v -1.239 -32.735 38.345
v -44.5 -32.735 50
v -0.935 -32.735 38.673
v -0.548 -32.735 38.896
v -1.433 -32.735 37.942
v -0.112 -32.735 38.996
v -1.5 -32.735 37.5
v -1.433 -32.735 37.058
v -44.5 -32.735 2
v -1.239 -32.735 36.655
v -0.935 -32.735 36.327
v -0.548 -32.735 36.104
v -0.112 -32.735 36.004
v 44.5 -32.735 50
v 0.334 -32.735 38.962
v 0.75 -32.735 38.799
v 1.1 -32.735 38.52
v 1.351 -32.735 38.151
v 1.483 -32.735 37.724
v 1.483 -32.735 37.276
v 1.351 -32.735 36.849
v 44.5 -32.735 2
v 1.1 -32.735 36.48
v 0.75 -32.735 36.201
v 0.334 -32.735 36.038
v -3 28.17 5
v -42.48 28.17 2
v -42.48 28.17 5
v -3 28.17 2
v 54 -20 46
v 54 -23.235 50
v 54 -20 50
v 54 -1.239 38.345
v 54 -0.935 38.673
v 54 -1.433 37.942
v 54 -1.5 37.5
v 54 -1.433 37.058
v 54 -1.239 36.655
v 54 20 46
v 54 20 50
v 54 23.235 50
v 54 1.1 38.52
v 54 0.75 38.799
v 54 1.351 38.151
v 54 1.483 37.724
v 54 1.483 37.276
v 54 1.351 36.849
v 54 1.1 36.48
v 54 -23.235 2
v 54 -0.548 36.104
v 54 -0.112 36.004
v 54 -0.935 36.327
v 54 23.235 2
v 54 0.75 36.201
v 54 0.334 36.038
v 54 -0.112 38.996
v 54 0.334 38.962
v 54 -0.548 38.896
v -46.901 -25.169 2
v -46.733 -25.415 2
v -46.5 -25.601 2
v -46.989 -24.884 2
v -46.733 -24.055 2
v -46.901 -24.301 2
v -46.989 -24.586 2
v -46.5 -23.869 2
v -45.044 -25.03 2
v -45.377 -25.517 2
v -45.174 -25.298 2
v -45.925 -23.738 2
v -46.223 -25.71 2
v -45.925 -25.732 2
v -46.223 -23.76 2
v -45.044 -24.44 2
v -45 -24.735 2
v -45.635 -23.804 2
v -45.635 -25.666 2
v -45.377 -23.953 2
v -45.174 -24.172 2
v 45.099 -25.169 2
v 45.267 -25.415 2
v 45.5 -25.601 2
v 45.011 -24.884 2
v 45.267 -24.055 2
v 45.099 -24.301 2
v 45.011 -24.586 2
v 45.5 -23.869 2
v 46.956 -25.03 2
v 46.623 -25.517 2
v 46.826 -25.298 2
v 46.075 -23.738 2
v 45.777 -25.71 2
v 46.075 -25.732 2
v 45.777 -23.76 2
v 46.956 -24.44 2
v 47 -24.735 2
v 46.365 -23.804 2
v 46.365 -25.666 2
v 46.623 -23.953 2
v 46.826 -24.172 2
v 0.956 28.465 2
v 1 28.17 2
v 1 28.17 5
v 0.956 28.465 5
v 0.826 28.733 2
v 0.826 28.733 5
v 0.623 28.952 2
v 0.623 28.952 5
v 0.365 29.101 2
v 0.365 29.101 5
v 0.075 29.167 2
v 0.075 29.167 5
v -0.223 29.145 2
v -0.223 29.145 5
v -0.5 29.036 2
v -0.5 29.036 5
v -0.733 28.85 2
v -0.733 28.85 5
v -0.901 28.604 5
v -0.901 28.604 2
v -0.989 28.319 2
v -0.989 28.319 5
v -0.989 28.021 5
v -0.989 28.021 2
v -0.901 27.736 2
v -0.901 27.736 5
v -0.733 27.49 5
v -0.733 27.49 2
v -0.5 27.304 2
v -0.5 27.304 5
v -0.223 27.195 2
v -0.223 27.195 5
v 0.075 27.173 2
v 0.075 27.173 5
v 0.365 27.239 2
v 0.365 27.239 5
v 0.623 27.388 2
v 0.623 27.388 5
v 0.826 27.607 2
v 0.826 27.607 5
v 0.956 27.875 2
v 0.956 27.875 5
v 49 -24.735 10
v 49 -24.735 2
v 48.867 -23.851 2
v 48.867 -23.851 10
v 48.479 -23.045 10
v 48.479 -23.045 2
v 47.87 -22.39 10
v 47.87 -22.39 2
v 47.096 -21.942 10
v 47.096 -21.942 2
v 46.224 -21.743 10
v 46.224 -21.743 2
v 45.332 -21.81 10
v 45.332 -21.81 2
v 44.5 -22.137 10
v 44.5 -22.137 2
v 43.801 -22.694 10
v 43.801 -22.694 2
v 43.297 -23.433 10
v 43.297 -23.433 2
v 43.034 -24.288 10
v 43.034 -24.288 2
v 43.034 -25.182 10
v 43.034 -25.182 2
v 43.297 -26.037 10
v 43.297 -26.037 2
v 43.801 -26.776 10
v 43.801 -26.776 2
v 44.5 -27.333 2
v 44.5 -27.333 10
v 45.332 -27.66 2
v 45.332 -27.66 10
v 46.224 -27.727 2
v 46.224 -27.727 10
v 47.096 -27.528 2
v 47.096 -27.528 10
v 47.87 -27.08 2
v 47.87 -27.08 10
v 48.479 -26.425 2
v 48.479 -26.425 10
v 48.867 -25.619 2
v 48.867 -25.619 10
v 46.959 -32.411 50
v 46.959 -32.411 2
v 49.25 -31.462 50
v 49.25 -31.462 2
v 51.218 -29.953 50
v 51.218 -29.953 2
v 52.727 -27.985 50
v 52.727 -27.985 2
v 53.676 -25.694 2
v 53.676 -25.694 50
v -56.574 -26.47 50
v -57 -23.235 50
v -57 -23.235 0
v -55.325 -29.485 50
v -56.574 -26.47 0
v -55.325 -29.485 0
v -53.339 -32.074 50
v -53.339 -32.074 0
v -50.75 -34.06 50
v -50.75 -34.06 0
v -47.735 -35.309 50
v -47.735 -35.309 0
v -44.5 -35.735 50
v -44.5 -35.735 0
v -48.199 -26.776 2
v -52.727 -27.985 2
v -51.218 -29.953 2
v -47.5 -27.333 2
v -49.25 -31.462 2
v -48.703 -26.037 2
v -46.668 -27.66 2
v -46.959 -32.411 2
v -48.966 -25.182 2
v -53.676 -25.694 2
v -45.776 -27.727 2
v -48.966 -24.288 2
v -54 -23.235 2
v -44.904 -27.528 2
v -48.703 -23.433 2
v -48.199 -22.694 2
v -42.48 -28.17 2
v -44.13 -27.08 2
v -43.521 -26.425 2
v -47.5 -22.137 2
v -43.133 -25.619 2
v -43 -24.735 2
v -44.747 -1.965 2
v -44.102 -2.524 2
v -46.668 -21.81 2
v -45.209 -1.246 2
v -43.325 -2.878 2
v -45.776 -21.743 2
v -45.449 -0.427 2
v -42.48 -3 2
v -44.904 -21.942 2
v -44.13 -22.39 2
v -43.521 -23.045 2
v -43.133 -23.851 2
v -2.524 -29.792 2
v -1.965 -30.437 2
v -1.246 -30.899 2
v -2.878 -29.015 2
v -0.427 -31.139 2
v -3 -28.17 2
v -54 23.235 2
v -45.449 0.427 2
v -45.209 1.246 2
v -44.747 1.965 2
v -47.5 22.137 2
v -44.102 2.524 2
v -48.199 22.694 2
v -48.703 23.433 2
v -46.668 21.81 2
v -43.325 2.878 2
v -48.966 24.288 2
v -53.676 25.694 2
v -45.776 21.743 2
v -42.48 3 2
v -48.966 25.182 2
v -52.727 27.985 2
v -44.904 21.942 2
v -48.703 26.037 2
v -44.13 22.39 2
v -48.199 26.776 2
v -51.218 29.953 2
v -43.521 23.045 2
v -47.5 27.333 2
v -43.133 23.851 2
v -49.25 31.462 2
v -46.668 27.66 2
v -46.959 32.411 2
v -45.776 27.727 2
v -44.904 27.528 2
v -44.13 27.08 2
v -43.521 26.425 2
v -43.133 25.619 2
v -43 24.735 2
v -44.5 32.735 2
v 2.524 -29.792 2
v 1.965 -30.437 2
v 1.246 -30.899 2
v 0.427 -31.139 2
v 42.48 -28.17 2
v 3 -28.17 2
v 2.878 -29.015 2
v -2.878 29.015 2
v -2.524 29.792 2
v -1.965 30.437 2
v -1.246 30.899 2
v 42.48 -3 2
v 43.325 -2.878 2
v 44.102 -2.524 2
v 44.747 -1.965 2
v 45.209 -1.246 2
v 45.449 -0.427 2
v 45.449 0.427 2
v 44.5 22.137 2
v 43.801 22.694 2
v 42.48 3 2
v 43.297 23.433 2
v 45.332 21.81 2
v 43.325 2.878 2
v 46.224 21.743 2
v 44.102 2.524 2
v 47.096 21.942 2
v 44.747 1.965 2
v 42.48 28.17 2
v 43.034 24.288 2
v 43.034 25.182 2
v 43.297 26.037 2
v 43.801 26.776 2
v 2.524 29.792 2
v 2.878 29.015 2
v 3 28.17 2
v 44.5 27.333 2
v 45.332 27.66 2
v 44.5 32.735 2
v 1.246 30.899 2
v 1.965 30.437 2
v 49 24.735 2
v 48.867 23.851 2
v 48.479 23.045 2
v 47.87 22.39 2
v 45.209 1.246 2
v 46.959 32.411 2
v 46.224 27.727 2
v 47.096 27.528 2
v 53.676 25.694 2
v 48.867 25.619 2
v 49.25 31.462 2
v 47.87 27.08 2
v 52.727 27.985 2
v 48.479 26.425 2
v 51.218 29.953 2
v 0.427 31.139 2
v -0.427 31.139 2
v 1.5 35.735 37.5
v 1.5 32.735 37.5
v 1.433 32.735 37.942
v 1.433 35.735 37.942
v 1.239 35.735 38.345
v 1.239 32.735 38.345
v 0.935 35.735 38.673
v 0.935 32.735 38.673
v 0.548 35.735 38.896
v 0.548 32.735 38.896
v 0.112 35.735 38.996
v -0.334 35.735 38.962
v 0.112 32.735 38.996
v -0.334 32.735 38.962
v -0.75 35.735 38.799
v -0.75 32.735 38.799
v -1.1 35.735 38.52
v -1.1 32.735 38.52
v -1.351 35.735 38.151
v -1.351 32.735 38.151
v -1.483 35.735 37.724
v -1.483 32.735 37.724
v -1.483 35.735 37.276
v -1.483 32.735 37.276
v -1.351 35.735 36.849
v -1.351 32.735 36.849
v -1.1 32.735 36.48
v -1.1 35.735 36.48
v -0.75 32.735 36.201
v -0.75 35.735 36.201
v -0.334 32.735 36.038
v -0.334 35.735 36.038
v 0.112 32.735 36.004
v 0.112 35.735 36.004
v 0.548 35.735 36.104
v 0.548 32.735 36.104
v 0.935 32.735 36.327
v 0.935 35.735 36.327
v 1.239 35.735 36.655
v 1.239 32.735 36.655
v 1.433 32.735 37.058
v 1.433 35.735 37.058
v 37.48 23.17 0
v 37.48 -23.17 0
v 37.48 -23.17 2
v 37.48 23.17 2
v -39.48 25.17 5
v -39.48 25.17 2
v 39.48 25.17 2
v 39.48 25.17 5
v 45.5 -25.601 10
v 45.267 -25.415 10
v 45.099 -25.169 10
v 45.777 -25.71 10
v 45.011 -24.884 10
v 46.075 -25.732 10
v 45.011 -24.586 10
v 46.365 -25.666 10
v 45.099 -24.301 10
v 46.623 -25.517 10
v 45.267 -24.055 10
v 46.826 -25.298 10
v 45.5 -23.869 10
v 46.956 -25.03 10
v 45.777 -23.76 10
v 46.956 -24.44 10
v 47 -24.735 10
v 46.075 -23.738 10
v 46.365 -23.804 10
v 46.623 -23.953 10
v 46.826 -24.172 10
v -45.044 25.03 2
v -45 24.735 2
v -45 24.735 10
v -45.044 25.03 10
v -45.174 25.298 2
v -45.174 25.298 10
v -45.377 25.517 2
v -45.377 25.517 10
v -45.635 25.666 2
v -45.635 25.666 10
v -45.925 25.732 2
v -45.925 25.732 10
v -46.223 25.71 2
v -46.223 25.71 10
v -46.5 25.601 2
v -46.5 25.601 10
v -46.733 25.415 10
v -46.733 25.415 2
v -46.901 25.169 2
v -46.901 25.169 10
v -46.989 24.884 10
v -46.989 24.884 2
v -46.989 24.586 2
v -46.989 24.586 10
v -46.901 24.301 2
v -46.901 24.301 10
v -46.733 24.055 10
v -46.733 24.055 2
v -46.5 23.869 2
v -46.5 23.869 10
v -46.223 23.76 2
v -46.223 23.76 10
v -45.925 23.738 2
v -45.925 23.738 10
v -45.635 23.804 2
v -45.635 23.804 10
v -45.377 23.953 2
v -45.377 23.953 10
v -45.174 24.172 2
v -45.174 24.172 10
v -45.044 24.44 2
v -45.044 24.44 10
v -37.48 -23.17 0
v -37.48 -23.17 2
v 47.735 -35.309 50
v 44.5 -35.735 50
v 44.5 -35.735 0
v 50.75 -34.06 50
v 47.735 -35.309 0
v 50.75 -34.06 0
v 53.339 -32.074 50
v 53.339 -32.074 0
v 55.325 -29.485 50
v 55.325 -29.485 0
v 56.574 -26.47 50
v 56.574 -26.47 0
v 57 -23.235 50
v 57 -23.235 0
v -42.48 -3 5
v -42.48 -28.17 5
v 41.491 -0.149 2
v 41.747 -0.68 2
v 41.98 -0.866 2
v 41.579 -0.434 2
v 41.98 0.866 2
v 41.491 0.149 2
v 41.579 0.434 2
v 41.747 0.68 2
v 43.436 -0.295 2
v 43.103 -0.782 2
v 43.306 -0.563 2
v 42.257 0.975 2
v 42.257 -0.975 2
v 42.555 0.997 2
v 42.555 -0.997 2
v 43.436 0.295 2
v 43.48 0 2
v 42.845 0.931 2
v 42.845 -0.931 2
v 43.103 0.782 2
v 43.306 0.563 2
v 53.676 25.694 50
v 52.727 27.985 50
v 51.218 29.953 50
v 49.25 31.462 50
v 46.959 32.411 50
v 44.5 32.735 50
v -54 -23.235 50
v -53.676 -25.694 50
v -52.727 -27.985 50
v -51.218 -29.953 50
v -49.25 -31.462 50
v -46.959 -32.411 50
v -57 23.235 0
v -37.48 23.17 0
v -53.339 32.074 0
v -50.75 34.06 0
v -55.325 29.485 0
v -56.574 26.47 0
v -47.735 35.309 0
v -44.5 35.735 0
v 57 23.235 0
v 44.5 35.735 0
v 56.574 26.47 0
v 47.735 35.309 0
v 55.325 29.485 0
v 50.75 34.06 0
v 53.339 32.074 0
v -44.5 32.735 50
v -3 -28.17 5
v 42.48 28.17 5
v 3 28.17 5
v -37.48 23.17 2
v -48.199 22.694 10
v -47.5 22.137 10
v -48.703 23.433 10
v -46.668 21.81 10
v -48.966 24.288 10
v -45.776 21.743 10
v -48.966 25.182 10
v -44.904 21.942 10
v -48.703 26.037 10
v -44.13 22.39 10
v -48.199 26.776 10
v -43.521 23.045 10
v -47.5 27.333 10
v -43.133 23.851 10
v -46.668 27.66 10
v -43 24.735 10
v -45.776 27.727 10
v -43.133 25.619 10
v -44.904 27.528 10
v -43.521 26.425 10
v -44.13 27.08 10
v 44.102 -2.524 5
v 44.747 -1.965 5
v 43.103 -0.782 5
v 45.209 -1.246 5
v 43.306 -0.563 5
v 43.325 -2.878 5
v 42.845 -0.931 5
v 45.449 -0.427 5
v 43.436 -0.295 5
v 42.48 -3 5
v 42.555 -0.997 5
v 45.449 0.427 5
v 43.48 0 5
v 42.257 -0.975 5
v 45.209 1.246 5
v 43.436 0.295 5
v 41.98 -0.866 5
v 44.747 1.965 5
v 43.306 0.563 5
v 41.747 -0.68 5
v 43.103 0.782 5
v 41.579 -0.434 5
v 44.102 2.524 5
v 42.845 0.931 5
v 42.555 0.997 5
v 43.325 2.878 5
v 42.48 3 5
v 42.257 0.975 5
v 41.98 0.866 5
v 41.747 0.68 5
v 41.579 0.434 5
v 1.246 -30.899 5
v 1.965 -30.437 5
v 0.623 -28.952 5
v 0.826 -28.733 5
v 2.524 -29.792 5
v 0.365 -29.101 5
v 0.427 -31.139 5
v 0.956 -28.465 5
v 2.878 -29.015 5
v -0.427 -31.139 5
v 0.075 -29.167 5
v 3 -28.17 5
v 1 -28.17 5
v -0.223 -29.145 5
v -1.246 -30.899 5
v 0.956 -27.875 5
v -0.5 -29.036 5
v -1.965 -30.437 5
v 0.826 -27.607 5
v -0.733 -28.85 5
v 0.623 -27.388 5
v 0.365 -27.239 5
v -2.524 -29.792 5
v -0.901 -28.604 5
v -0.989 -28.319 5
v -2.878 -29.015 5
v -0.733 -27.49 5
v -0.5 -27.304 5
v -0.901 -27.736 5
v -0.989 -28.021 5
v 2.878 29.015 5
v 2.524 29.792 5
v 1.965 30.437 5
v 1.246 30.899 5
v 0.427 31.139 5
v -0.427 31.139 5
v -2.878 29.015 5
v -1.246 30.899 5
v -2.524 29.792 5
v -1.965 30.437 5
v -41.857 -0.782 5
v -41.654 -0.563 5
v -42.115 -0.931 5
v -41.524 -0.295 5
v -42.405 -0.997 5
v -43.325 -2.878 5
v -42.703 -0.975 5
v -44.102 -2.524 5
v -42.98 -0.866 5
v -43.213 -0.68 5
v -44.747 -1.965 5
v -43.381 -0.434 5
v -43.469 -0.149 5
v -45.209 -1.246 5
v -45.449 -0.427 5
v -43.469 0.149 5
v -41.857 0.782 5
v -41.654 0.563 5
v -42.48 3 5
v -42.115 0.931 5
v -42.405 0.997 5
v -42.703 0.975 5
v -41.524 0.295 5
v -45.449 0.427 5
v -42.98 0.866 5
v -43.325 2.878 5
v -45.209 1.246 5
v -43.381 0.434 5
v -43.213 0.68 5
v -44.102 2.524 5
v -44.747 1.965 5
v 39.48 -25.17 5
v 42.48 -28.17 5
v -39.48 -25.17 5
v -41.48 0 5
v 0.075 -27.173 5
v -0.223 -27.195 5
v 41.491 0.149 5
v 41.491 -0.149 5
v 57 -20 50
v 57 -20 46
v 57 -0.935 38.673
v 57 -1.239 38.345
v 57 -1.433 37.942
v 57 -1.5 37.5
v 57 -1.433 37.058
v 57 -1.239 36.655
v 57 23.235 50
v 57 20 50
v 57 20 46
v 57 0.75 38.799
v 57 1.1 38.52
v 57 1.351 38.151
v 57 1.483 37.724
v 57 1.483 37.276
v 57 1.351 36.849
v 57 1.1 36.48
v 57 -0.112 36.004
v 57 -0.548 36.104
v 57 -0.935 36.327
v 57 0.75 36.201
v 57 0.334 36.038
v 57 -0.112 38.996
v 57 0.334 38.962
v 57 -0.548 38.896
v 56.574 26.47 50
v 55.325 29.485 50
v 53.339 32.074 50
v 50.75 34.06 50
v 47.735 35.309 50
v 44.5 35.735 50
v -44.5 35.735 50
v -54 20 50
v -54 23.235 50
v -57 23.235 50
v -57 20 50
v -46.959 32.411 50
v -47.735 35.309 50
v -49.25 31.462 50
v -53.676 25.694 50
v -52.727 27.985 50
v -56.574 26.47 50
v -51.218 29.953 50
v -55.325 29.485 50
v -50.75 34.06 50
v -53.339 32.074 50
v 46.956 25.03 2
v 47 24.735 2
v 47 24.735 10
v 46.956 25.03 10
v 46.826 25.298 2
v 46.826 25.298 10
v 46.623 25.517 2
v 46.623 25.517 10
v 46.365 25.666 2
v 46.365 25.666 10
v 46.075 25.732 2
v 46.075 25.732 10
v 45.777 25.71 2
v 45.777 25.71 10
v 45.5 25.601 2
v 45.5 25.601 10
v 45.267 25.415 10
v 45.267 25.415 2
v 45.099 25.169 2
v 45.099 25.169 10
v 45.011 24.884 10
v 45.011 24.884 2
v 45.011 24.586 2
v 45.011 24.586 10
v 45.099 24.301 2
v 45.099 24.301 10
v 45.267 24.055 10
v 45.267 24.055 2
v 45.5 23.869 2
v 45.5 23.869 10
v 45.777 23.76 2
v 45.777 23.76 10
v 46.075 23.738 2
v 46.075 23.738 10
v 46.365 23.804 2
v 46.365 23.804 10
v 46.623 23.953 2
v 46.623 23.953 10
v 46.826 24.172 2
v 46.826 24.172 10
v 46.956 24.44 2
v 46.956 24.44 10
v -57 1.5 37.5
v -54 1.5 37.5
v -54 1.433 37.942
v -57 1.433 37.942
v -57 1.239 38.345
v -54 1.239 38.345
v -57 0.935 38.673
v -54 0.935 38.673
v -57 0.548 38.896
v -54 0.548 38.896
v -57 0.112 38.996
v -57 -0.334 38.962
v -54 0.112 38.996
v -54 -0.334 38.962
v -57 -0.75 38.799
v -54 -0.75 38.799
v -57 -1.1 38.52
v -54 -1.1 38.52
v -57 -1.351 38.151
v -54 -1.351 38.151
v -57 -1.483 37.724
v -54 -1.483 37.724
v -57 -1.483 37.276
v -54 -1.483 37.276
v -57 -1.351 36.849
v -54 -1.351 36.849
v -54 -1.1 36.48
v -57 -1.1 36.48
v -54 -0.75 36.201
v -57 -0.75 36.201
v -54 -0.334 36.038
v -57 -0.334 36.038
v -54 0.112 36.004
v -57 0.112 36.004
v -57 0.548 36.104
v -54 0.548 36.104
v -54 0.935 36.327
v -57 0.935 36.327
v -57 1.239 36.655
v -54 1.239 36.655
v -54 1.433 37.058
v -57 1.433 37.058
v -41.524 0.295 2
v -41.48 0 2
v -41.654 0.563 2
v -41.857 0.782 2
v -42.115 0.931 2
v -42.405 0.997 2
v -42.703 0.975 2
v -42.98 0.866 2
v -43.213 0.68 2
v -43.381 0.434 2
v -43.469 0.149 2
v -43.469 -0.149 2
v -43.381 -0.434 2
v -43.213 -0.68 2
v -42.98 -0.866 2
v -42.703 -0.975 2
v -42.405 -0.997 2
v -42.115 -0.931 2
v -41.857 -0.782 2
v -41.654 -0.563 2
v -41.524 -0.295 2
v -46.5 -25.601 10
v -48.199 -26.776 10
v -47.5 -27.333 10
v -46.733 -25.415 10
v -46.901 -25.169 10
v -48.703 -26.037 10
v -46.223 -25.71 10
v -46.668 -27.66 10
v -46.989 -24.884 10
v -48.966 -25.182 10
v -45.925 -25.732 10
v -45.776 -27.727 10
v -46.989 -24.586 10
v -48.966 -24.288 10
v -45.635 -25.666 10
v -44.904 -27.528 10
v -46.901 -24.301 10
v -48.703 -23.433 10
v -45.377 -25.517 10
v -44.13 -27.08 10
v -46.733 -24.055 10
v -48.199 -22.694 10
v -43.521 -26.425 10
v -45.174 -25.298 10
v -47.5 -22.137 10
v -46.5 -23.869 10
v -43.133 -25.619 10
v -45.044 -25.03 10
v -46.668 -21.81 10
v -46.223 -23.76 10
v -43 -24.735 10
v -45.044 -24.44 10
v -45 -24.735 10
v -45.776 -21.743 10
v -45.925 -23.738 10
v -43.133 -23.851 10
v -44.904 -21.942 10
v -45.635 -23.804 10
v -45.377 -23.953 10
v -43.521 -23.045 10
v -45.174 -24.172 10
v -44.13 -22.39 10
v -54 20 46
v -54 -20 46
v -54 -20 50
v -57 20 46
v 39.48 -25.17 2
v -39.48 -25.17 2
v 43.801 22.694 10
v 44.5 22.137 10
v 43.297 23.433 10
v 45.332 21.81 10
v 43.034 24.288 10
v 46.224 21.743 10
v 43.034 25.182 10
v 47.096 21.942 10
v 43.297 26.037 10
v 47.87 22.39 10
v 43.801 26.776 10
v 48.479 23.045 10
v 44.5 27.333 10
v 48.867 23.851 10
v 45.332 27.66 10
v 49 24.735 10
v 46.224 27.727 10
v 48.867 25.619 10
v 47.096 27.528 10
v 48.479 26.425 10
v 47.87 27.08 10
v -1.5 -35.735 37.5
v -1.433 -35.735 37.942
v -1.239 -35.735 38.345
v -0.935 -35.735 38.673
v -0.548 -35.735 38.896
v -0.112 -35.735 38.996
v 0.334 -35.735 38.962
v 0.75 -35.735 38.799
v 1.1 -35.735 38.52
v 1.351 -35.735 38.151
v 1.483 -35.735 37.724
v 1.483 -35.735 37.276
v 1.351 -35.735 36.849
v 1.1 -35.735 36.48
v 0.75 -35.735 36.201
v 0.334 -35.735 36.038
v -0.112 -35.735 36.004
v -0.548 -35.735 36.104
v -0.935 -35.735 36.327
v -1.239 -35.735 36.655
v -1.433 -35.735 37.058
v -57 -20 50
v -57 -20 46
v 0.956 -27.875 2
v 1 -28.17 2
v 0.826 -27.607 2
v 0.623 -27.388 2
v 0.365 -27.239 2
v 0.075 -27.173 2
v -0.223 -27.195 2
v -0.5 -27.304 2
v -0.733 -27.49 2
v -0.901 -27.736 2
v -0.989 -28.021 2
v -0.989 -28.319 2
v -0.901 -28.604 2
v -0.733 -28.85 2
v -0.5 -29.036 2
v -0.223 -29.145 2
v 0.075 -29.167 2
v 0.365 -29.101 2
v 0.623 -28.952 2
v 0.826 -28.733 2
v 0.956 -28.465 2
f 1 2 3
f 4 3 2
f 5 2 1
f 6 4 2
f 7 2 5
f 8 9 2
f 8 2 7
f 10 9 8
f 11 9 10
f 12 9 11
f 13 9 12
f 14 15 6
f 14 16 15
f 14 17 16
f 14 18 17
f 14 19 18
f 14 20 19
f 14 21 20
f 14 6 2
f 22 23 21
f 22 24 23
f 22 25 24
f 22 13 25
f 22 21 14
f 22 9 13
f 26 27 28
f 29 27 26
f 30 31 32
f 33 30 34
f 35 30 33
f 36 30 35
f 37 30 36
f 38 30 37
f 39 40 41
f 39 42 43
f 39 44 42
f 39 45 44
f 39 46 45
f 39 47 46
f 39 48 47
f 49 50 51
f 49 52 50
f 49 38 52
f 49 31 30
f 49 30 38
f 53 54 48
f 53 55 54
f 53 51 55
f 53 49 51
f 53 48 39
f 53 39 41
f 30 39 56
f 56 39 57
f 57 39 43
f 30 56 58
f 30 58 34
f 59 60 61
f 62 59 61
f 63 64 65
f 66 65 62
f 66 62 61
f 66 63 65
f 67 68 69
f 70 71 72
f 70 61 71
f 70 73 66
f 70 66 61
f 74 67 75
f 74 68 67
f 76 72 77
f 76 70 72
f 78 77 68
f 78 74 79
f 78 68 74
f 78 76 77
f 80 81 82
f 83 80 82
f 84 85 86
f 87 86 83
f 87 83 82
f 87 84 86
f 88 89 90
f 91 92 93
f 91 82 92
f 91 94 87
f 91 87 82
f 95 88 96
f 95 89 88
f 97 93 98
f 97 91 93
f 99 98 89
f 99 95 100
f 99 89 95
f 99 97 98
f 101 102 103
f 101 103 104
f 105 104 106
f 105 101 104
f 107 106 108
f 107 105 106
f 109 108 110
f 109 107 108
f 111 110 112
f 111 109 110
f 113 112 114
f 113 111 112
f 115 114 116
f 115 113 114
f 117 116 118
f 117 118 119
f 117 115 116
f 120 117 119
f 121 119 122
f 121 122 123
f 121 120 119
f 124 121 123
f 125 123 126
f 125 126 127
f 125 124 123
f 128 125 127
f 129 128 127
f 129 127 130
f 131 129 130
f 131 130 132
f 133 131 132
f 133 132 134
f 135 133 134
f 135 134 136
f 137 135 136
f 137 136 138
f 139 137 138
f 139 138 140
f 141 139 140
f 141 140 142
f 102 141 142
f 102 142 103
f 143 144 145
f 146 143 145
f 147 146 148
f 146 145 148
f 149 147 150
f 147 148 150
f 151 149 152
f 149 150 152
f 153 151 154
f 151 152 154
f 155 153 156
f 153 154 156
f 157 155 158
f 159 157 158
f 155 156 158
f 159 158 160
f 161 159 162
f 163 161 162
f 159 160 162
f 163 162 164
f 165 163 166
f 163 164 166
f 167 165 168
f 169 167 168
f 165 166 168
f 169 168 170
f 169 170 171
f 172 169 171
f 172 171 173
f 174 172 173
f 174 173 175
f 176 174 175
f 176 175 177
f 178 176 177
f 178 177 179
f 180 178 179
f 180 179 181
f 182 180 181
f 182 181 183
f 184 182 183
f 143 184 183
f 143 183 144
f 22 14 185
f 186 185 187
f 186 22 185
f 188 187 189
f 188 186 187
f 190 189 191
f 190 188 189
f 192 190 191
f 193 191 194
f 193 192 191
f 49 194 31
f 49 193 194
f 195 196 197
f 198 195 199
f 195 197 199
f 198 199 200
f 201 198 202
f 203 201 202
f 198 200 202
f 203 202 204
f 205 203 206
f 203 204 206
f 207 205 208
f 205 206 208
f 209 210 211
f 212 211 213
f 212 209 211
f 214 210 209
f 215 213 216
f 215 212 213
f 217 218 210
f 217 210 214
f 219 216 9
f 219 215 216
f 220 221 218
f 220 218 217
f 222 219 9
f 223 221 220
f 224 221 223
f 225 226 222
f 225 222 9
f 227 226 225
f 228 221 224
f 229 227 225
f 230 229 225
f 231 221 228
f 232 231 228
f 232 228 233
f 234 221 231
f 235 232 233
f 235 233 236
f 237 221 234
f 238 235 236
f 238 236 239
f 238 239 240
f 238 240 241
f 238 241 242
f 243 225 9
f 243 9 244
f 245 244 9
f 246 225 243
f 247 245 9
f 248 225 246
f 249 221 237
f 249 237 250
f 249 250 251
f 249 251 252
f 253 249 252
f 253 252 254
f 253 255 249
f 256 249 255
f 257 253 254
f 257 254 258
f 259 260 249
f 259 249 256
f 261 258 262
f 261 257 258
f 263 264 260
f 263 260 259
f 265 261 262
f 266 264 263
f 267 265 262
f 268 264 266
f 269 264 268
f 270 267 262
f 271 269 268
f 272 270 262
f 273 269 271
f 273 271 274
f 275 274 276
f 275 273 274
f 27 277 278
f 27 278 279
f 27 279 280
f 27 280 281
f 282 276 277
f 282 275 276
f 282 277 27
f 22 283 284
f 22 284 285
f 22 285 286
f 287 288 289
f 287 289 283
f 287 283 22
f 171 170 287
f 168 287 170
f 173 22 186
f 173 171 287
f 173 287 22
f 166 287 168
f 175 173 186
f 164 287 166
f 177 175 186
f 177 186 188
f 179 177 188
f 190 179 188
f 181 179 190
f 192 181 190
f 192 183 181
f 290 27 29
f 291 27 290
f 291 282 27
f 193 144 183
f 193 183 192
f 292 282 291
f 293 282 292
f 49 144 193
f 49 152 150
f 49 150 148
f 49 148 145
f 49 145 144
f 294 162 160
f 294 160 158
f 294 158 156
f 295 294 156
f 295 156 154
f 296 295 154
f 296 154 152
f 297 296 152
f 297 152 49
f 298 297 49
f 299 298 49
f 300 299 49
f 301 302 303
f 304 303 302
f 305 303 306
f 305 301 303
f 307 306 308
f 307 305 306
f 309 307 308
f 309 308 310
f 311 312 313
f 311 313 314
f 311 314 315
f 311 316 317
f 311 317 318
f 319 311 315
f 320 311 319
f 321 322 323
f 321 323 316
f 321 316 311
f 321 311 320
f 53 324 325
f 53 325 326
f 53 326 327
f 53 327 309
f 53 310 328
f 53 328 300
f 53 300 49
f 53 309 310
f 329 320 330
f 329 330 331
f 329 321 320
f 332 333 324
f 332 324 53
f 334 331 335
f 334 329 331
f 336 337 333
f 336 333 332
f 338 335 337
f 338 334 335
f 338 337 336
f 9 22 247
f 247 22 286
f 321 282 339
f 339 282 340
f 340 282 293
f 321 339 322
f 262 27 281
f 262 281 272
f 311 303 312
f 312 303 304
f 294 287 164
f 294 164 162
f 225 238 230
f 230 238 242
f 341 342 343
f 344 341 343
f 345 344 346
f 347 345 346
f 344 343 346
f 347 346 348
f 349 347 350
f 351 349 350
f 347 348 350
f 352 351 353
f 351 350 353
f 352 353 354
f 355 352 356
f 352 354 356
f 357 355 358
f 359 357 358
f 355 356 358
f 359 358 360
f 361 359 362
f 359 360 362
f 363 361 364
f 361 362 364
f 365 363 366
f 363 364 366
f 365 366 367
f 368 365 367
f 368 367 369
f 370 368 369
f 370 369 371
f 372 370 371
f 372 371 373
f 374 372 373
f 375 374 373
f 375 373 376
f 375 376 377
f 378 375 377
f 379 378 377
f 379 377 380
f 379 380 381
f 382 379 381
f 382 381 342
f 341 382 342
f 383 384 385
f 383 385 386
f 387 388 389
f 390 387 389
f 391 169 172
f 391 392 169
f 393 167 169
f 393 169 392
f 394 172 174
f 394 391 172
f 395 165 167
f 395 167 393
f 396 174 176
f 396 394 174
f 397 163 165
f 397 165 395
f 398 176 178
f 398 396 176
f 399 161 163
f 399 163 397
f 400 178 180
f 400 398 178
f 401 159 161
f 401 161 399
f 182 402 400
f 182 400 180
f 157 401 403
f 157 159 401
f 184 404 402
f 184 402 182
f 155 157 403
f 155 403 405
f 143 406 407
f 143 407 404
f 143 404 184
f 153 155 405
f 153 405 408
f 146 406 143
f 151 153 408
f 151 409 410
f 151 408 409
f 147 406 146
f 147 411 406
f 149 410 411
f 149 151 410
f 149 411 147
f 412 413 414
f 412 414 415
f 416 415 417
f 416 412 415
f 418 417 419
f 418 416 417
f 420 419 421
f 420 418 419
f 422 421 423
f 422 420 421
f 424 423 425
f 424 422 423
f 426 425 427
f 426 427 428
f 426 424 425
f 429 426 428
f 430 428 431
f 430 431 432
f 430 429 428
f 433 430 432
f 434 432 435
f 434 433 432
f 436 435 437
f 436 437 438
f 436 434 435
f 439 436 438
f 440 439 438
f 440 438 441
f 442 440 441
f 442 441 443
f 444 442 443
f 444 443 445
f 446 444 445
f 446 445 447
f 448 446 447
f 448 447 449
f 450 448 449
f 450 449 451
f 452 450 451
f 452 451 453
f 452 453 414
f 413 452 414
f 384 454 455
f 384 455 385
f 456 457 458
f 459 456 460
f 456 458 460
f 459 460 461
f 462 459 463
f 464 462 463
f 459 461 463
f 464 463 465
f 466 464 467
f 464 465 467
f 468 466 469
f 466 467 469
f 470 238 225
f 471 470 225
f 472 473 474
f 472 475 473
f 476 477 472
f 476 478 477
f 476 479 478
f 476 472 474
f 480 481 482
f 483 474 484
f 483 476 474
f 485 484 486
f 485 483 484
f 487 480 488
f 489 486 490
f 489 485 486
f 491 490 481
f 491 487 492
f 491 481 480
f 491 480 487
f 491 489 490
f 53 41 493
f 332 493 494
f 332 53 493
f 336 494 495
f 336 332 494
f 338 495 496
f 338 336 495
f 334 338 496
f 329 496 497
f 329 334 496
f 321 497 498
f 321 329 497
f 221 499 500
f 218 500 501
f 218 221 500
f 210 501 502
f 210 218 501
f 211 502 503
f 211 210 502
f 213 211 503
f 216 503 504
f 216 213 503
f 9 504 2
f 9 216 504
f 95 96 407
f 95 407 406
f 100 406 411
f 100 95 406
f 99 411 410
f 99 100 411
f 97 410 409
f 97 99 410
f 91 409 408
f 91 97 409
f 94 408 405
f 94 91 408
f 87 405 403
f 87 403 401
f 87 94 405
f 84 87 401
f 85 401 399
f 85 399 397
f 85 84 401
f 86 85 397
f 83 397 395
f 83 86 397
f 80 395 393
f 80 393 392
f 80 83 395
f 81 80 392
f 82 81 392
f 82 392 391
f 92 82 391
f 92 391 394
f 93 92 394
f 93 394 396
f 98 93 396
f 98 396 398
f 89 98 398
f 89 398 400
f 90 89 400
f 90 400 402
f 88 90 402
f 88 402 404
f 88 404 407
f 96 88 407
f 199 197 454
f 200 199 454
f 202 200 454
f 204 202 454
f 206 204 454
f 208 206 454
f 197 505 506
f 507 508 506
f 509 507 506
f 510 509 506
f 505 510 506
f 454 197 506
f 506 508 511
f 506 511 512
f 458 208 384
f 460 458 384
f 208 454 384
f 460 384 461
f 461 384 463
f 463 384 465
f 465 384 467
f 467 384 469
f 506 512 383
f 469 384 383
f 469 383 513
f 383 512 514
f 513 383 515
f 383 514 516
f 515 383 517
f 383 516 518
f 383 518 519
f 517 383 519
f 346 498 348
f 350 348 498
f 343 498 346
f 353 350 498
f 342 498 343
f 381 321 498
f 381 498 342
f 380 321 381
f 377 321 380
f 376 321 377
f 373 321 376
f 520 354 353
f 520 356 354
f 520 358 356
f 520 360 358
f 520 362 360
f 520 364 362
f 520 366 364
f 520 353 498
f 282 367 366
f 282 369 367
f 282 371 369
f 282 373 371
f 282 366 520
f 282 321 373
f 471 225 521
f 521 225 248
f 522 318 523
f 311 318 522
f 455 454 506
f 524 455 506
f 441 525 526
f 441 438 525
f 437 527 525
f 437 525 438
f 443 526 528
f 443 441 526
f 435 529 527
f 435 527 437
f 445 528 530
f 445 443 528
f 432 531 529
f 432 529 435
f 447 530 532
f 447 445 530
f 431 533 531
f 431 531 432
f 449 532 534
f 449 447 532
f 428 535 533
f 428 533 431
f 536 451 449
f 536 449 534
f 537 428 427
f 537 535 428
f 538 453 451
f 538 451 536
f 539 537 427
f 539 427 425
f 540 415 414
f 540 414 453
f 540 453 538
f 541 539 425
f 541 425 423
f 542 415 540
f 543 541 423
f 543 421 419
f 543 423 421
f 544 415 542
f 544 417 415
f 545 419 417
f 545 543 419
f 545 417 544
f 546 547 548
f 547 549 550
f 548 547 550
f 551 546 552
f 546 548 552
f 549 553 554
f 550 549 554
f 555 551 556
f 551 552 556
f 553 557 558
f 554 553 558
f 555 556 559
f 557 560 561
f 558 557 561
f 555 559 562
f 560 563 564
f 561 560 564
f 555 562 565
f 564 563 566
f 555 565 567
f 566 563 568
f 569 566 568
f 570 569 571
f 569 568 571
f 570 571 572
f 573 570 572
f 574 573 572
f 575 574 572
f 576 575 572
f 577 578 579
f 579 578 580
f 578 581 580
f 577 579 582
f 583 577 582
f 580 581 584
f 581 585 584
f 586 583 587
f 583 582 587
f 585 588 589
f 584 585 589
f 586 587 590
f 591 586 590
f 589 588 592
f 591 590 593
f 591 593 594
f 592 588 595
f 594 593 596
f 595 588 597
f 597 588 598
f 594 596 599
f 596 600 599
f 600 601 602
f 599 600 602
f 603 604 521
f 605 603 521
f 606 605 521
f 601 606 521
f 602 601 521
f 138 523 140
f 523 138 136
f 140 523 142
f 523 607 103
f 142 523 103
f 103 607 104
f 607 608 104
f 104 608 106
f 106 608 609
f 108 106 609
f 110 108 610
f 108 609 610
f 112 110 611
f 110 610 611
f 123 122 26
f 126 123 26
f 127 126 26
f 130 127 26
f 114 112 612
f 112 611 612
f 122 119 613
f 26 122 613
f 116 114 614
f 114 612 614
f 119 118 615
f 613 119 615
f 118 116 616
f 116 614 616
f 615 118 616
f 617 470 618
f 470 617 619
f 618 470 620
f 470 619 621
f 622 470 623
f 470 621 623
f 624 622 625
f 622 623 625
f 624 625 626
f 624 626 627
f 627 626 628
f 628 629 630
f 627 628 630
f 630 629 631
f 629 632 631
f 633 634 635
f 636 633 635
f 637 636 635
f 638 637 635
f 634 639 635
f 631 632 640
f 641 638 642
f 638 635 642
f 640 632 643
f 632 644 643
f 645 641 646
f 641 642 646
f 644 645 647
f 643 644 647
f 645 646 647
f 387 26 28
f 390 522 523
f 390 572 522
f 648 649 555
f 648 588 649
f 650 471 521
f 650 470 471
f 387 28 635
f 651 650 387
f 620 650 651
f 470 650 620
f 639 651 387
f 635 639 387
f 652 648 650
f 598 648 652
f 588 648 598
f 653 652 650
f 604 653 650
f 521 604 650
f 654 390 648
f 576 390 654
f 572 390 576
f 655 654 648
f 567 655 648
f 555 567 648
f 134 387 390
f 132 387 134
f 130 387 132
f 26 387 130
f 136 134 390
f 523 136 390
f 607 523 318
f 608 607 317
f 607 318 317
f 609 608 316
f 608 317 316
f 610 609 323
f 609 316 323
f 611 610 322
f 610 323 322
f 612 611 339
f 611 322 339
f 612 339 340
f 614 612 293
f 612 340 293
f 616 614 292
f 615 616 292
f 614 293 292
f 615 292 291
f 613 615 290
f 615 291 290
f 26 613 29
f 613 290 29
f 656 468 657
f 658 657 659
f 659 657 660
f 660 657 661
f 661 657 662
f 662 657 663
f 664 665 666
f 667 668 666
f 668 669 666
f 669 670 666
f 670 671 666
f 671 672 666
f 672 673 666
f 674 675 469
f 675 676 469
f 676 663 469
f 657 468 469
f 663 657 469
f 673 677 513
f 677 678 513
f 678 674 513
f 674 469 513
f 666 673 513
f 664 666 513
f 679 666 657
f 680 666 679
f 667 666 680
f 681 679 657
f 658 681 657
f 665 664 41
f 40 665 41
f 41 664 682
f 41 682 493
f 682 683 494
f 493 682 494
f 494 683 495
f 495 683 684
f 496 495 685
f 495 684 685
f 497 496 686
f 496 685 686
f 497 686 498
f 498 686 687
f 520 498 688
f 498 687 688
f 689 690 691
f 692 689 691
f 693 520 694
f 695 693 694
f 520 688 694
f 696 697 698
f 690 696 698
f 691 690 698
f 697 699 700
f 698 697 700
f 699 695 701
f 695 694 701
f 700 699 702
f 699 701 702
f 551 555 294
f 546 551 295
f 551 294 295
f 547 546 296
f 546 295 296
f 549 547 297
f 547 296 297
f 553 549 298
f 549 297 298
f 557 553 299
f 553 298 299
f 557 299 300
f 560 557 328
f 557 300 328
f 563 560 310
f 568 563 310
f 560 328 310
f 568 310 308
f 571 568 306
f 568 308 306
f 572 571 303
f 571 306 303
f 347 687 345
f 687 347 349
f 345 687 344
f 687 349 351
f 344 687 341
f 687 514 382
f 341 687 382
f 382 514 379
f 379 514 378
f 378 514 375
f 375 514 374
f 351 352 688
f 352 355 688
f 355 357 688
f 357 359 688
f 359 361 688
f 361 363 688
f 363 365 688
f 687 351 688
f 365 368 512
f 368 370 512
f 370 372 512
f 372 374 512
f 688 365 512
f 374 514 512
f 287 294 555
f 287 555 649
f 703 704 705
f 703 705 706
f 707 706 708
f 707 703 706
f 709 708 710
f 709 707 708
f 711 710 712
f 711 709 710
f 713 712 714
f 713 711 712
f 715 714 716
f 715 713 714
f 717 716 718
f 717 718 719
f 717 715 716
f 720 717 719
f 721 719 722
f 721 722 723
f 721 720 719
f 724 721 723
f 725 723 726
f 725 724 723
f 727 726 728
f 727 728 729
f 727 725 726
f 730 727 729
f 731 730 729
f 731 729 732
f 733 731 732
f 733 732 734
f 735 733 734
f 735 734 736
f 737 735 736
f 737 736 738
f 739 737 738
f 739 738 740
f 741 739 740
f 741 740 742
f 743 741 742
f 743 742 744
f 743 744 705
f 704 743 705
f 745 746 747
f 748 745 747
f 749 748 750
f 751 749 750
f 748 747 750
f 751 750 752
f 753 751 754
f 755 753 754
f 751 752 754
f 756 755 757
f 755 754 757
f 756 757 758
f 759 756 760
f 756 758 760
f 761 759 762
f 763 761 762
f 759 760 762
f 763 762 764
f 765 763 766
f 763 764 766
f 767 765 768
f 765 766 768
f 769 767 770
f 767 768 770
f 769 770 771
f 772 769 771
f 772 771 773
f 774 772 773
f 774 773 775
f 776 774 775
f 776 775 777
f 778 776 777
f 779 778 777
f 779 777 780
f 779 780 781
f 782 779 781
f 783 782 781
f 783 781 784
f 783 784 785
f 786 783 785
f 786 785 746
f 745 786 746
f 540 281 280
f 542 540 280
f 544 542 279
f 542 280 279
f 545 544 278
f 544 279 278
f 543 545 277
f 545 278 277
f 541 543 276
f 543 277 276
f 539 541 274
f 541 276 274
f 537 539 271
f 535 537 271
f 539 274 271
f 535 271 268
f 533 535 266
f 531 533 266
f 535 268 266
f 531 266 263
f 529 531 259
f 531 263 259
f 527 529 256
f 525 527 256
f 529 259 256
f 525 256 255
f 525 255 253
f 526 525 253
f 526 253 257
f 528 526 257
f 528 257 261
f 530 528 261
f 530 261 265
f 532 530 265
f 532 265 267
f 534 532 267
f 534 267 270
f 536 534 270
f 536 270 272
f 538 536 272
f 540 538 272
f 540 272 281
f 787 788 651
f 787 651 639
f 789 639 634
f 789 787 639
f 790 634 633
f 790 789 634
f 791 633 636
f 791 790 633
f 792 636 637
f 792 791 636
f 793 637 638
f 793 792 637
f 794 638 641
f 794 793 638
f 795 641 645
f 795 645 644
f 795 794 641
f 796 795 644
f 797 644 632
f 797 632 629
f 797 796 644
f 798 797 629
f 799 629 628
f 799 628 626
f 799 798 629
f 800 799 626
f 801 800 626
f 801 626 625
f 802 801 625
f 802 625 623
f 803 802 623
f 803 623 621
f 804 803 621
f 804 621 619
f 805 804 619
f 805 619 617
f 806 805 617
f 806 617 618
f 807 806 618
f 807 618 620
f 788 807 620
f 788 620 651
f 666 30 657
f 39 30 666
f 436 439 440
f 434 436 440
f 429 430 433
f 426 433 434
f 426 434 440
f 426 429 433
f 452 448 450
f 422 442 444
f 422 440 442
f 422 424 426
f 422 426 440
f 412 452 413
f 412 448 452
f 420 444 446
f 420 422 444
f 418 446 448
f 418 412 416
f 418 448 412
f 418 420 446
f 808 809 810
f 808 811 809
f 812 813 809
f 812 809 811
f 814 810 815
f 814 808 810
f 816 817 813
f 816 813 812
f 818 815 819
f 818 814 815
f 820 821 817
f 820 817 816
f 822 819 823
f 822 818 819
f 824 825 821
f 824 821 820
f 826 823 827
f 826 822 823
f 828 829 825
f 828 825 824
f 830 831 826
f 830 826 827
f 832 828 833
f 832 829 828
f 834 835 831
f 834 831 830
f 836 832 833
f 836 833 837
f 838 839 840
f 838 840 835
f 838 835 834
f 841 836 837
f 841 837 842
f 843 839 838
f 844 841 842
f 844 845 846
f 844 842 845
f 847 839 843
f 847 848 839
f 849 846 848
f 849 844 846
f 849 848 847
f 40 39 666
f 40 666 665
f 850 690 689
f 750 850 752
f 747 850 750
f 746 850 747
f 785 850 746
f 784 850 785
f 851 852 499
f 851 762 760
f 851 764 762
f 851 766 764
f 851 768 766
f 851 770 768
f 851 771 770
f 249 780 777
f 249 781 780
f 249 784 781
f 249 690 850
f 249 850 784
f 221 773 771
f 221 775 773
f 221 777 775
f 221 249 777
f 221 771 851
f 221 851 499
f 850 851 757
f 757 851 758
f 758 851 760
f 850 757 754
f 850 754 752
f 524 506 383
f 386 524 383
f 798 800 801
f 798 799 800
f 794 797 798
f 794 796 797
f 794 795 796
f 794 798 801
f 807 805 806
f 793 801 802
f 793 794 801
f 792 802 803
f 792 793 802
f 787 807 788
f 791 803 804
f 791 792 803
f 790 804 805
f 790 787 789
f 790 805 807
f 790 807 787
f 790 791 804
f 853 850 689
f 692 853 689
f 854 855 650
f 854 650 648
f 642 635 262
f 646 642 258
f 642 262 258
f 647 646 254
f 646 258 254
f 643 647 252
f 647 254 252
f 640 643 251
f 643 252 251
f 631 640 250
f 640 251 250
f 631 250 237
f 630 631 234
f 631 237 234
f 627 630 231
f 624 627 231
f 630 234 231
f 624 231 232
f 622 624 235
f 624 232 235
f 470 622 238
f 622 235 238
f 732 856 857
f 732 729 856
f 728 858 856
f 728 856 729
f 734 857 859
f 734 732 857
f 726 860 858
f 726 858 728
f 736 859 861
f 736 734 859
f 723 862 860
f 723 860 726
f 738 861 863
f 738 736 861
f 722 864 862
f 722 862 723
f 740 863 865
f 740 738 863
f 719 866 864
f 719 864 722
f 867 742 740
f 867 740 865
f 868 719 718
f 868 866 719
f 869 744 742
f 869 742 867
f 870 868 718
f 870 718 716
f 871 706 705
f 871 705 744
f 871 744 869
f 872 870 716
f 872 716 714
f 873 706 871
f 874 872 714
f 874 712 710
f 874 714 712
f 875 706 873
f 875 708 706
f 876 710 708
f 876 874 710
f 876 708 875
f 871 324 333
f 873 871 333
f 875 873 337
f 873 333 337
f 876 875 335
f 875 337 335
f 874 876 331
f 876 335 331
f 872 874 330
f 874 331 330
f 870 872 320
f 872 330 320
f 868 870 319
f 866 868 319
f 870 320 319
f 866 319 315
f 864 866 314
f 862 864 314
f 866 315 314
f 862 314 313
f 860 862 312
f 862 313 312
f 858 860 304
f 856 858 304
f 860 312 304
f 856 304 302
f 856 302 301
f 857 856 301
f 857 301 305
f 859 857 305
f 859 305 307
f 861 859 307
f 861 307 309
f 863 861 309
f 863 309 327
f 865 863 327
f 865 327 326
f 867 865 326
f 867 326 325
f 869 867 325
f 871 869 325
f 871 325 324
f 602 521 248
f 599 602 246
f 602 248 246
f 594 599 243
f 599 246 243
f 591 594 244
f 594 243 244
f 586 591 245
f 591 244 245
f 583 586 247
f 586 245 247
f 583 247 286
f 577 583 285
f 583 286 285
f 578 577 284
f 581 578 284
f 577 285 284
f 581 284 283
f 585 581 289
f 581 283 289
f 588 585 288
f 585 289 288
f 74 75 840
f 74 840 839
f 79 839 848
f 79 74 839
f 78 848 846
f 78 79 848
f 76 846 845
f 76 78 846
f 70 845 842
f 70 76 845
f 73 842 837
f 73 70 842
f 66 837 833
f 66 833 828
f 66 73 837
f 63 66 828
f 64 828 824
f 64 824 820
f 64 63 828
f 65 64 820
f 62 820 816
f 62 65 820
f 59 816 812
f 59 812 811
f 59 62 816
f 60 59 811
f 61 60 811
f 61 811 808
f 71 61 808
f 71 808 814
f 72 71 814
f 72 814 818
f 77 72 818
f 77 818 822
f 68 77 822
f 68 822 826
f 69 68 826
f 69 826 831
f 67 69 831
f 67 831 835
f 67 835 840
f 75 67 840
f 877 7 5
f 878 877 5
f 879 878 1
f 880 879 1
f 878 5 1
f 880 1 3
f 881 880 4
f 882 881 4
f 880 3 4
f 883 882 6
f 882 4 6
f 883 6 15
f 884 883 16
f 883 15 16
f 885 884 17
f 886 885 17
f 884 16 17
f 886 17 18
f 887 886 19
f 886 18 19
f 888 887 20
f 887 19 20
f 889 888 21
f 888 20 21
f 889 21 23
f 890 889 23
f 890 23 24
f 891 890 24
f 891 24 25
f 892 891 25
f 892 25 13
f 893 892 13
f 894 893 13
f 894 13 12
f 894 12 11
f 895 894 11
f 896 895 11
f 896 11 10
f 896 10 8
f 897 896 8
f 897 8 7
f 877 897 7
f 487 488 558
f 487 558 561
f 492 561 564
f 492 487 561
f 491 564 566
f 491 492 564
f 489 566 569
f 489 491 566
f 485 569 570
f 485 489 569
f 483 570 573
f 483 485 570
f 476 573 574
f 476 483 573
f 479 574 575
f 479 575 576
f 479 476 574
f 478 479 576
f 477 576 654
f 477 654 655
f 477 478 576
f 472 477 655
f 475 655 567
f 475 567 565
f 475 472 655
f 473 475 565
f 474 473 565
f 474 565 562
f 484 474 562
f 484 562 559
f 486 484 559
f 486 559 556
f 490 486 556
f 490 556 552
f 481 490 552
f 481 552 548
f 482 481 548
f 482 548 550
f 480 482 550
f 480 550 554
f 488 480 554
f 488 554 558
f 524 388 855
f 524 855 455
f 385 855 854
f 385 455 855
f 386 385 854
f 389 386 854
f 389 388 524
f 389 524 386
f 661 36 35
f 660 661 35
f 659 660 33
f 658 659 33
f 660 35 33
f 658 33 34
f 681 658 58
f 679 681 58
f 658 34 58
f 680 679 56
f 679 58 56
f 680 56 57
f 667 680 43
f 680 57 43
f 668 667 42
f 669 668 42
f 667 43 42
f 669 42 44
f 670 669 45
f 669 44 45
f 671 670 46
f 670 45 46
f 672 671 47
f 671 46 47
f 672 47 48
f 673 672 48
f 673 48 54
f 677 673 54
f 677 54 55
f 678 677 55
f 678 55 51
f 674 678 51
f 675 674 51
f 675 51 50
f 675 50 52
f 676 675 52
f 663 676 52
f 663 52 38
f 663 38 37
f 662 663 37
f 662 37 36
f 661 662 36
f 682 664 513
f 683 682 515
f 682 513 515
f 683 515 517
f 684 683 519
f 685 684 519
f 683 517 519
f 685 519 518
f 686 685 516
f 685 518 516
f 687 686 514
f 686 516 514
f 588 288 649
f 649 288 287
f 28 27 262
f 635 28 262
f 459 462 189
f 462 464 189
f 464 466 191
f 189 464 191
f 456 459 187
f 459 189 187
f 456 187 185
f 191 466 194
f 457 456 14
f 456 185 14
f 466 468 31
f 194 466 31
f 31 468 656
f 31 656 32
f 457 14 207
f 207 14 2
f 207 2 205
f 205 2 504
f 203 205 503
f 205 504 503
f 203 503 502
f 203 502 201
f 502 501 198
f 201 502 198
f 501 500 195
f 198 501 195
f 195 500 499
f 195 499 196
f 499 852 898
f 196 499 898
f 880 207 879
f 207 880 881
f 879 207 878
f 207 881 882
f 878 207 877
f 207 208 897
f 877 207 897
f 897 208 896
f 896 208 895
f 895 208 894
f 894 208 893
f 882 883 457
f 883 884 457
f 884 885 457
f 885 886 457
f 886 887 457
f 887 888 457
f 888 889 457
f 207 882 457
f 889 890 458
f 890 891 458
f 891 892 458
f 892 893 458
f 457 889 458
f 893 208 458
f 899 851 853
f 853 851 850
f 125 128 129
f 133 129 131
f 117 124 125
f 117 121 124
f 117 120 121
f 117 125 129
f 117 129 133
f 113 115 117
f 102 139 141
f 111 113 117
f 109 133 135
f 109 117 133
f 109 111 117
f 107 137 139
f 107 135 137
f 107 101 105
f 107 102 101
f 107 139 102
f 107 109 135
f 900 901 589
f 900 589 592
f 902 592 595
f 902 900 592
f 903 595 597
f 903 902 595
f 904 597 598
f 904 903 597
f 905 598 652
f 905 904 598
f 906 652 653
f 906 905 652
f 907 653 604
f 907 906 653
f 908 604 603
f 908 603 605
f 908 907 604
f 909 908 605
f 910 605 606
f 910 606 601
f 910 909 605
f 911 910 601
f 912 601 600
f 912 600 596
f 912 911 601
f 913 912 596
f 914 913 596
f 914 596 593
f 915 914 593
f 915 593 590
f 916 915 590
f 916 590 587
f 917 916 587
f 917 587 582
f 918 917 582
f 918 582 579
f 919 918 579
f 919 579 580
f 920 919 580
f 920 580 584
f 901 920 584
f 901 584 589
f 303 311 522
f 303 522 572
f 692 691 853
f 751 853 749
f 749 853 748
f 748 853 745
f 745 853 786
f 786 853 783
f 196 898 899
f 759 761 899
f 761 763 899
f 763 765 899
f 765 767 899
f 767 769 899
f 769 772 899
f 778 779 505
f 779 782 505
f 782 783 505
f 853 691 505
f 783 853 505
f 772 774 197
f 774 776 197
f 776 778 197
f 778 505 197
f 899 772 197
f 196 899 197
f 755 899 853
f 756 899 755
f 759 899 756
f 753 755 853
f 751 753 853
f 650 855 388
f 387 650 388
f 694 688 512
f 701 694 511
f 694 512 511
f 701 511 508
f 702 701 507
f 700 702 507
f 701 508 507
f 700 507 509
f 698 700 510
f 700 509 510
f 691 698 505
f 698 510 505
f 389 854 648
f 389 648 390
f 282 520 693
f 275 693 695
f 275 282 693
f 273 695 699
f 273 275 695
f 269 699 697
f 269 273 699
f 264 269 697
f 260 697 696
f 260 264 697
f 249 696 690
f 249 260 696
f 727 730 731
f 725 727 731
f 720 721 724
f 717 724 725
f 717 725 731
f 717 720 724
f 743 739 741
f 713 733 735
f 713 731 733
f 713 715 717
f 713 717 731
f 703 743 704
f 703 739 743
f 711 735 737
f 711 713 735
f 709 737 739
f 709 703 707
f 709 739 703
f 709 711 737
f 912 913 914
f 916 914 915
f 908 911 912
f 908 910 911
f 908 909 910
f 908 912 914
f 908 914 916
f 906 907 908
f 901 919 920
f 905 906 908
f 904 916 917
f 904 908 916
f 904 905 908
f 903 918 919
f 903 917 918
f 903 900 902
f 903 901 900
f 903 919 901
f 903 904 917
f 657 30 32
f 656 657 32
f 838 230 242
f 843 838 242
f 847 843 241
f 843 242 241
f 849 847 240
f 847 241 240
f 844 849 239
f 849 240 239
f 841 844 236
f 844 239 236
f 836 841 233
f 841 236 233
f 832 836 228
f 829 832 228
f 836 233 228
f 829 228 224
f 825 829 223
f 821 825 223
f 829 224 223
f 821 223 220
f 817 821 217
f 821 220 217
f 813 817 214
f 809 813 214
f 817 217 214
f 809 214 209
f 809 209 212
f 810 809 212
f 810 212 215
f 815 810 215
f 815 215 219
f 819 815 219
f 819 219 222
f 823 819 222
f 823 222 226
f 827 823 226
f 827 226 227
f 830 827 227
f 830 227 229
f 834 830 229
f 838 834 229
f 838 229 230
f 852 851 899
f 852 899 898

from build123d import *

# Parameters (mm, degrees)
SKETCH_R           = 1
SKETCH_W           = 78.96
SKETCH_H           = 50.34
PAD_DEPTH          = 5
SKETCH001_W        = 74.96
SKETCH001_H        = 46.34
PAD001_DEPTH       = 2
SKETCH002_R        = 3
SKETCH002_R_2      = 1
PAD002_DEPTH       = 10
PAD003_DEPTH       = 50
SKETCH004_W        = 40
SKETCH004_H        = 4
POCKET_DEPTH       = 57.001
POCKET_DEPTH_BACK  = -57.001
SKETCH005_R        = 1.5
POCKET001_DEPTH    = 322.817597
POLARPATTERN_COUNT = 4


with BuildPart() as part:
    # Sketch → Pad (new body)
    with BuildSketch(Plane.XY):
        with BuildLine():
            Line((-42.48, 28.17), (-3, 28.17))
            ThreePointArc((3, 28.17), (0, 31.17), (-3, 28.17))
            Line((3, 28.17), (42.48, 28.17))
            Line((42.48, 28.17), (42.48, 3))
            ThreePointArc((42.48, -3), (45.48, 0), (42.48, 3))
            Line((42.48, -3), (42.48, -28.17))
            Line((3, -28.17), (42.48, -28.17))
            ThreePointArc((-3, -28.17), (0, -31.17), (3, -28.17))
            Line((-42.48, -28.17), (-3, -28.17))
            Line((-42.48, -3), (-42.48, -28.17))
            ThreePointArc((-42.48, 3), (-45.48, 0), (-42.48, -3))
            Line((-42.48, 28.17), (-42.48, 3))
        make_face()
        with Locations((42.48, 0)):
            Circle(SKETCH_R, mode=Mode.SUBTRACT)
        with Locations((0, -28.17)):
            Circle(SKETCH_R, mode=Mode.SUBTRACT)
        with Locations((-42.48, 0)):
            Circle(SKETCH_R, mode=Mode.SUBTRACT)
        with Locations((0, 28.17)):
            Circle(SKETCH_R, mode=Mode.SUBTRACT)
        Rectangle(SKETCH_W, SKETCH_H, mode=Mode.SUBTRACT)
    extrude(amount=PAD_DEPTH)

    # Sketch001 → Pad001 (join)
    with BuildSketch(Plane.XY):
        with BuildLine():
            Line((-57, 23.235), (-57, -23.235))
            ThreePointArc((-57, -23.235), (-53.338835, -32.073835), (-44.5, -35.735))
            Line((-44.5, -35.735), (44.5, -35.735))
            ThreePointArc((44.5, -35.735), (53.338835, -32.073835), (57, -23.235))
            Line((57, -23.235), (57, 23.235))
            ThreePointArc((57, 23.235), (53.338835, 32.073835), (44.5, 35.735))
            Line((44.5, 35.735), (-44.5, 35.735))
            ThreePointArc((-44.5, 35.735), (-53.338835, 32.073835), (-57, 23.235))
        make_face()
        Rectangle(SKETCH001_W, SKETCH001_H, mode=Mode.SUBTRACT)
    extrude(amount=PAD001_DEPTH)

    # Sketch002 → Pad002 (join)
    with BuildSketch(Plane.XY):
        with Locations((-46, 24.735)):
            Circle(SKETCH002_R)
        with Locations((-46, 24.735)):
            Circle(SKETCH002_R_2, mode=Mode.SUBTRACT)
        with Locations((46, 24.735)):
            Circle(SKETCH002_R)
        with Locations((46, 24.735)):
            Circle(SKETCH002_R_2, mode=Mode.SUBTRACT)
        with Locations((46, -24.735)):
            Circle(SKETCH002_R)
        with Locations((46, -24.735)):
            Circle(SKETCH002_R_2, mode=Mode.SUBTRACT)
        with Locations((-46, -24.735)):
            Circle(SKETCH002_R)
        with Locations((-46, -24.735)):
            Circle(SKETCH002_R_2, mode=Mode.SUBTRACT)
    extrude(amount=PAD002_DEPTH)

    # Sketch003 → Pad003 (join)
    with BuildSketch(Plane.XY):
        with BuildLine():
            Line((-44.5, 35.735), (44.5, 35.735))
            ThreePointArc((57, 23.235), (53.338835, 32.073835), (44.5, 35.735))
            Line((57, 23.235), (57, -23.235))
            ThreePointArc((44.5, -35.735), (53.338835, -32.073835), (57, -23.235))
            Line((44.5, -35.735), (-44.5, -35.735))
            ThreePointArc((-57, -23.235), (-53.338835, -32.073835), (-44.5, -35.735))
            Line((-57, -23.235), (-57, 23.235))
            ThreePointArc((-44.5, 35.735), (-53.338835, 32.073835), (-57, 23.235))
        make_face()
        with BuildLine():
            Line((-54, 23.235), (-54, -23.235))
            ThreePointArc((-54, -23.235), (-51.217514, -29.952514), (-44.5, -32.735))
            Line((-44.5, -32.735), (44.5, -32.735))
            ThreePointArc((44.5, -32.735), (51.217514, -29.952514), (54, -23.235))
            Line((54, -23.235), (54, 23.235))
            ThreePointArc((54, 23.235), (51.217514, 29.952514), (44.5, 32.735))
            Line((44.5, 32.735), (-44.5, 32.735))
            ThreePointArc((-44.5, 32.735), (-51.217514, 29.952514), (-54, 23.235))
        make_face(mode=Mode.SUBTRACT)
    extrude(amount=PAD003_DEPTH)

    # Sketch004 → Pocket (cut, two sides)
    with BuildSketch(Plane.YZ) as pocket_sk:
        with Locations((0, 48)):
            Rectangle(SKETCH004_W, SKETCH004_H)
    extrude(amount=-POCKET_DEPTH, mode=Mode.SUBTRACT)
    extrude(pocket_sk.sketch, amount=-POCKET_DEPTH_BACK, mode=Mode.SUBTRACT)

    # Sketch005 → Pocket001 (cut, through all)
    with BuildSketch(Plane.XZ):
        with Locations((0, 37.5)):
            Circle(SKETCH005_R)
    pocket001 = extrude(amount=-POCKET001_DEPTH, mode=Mode.SUBTRACT)

    # PolarPattern: Pocket001 ×4 about axis
    polarpattern_axis = Axis((0, 0, 0), (0, 0, 1))
    for i in range(1, POLARPATTERN_COUNT):
        add(pocket001.rotate(polarpattern_axis, i * 360 / POLARPATTERN_COUNT), mode=Mode.SUBTRACT)


solid = part.part
